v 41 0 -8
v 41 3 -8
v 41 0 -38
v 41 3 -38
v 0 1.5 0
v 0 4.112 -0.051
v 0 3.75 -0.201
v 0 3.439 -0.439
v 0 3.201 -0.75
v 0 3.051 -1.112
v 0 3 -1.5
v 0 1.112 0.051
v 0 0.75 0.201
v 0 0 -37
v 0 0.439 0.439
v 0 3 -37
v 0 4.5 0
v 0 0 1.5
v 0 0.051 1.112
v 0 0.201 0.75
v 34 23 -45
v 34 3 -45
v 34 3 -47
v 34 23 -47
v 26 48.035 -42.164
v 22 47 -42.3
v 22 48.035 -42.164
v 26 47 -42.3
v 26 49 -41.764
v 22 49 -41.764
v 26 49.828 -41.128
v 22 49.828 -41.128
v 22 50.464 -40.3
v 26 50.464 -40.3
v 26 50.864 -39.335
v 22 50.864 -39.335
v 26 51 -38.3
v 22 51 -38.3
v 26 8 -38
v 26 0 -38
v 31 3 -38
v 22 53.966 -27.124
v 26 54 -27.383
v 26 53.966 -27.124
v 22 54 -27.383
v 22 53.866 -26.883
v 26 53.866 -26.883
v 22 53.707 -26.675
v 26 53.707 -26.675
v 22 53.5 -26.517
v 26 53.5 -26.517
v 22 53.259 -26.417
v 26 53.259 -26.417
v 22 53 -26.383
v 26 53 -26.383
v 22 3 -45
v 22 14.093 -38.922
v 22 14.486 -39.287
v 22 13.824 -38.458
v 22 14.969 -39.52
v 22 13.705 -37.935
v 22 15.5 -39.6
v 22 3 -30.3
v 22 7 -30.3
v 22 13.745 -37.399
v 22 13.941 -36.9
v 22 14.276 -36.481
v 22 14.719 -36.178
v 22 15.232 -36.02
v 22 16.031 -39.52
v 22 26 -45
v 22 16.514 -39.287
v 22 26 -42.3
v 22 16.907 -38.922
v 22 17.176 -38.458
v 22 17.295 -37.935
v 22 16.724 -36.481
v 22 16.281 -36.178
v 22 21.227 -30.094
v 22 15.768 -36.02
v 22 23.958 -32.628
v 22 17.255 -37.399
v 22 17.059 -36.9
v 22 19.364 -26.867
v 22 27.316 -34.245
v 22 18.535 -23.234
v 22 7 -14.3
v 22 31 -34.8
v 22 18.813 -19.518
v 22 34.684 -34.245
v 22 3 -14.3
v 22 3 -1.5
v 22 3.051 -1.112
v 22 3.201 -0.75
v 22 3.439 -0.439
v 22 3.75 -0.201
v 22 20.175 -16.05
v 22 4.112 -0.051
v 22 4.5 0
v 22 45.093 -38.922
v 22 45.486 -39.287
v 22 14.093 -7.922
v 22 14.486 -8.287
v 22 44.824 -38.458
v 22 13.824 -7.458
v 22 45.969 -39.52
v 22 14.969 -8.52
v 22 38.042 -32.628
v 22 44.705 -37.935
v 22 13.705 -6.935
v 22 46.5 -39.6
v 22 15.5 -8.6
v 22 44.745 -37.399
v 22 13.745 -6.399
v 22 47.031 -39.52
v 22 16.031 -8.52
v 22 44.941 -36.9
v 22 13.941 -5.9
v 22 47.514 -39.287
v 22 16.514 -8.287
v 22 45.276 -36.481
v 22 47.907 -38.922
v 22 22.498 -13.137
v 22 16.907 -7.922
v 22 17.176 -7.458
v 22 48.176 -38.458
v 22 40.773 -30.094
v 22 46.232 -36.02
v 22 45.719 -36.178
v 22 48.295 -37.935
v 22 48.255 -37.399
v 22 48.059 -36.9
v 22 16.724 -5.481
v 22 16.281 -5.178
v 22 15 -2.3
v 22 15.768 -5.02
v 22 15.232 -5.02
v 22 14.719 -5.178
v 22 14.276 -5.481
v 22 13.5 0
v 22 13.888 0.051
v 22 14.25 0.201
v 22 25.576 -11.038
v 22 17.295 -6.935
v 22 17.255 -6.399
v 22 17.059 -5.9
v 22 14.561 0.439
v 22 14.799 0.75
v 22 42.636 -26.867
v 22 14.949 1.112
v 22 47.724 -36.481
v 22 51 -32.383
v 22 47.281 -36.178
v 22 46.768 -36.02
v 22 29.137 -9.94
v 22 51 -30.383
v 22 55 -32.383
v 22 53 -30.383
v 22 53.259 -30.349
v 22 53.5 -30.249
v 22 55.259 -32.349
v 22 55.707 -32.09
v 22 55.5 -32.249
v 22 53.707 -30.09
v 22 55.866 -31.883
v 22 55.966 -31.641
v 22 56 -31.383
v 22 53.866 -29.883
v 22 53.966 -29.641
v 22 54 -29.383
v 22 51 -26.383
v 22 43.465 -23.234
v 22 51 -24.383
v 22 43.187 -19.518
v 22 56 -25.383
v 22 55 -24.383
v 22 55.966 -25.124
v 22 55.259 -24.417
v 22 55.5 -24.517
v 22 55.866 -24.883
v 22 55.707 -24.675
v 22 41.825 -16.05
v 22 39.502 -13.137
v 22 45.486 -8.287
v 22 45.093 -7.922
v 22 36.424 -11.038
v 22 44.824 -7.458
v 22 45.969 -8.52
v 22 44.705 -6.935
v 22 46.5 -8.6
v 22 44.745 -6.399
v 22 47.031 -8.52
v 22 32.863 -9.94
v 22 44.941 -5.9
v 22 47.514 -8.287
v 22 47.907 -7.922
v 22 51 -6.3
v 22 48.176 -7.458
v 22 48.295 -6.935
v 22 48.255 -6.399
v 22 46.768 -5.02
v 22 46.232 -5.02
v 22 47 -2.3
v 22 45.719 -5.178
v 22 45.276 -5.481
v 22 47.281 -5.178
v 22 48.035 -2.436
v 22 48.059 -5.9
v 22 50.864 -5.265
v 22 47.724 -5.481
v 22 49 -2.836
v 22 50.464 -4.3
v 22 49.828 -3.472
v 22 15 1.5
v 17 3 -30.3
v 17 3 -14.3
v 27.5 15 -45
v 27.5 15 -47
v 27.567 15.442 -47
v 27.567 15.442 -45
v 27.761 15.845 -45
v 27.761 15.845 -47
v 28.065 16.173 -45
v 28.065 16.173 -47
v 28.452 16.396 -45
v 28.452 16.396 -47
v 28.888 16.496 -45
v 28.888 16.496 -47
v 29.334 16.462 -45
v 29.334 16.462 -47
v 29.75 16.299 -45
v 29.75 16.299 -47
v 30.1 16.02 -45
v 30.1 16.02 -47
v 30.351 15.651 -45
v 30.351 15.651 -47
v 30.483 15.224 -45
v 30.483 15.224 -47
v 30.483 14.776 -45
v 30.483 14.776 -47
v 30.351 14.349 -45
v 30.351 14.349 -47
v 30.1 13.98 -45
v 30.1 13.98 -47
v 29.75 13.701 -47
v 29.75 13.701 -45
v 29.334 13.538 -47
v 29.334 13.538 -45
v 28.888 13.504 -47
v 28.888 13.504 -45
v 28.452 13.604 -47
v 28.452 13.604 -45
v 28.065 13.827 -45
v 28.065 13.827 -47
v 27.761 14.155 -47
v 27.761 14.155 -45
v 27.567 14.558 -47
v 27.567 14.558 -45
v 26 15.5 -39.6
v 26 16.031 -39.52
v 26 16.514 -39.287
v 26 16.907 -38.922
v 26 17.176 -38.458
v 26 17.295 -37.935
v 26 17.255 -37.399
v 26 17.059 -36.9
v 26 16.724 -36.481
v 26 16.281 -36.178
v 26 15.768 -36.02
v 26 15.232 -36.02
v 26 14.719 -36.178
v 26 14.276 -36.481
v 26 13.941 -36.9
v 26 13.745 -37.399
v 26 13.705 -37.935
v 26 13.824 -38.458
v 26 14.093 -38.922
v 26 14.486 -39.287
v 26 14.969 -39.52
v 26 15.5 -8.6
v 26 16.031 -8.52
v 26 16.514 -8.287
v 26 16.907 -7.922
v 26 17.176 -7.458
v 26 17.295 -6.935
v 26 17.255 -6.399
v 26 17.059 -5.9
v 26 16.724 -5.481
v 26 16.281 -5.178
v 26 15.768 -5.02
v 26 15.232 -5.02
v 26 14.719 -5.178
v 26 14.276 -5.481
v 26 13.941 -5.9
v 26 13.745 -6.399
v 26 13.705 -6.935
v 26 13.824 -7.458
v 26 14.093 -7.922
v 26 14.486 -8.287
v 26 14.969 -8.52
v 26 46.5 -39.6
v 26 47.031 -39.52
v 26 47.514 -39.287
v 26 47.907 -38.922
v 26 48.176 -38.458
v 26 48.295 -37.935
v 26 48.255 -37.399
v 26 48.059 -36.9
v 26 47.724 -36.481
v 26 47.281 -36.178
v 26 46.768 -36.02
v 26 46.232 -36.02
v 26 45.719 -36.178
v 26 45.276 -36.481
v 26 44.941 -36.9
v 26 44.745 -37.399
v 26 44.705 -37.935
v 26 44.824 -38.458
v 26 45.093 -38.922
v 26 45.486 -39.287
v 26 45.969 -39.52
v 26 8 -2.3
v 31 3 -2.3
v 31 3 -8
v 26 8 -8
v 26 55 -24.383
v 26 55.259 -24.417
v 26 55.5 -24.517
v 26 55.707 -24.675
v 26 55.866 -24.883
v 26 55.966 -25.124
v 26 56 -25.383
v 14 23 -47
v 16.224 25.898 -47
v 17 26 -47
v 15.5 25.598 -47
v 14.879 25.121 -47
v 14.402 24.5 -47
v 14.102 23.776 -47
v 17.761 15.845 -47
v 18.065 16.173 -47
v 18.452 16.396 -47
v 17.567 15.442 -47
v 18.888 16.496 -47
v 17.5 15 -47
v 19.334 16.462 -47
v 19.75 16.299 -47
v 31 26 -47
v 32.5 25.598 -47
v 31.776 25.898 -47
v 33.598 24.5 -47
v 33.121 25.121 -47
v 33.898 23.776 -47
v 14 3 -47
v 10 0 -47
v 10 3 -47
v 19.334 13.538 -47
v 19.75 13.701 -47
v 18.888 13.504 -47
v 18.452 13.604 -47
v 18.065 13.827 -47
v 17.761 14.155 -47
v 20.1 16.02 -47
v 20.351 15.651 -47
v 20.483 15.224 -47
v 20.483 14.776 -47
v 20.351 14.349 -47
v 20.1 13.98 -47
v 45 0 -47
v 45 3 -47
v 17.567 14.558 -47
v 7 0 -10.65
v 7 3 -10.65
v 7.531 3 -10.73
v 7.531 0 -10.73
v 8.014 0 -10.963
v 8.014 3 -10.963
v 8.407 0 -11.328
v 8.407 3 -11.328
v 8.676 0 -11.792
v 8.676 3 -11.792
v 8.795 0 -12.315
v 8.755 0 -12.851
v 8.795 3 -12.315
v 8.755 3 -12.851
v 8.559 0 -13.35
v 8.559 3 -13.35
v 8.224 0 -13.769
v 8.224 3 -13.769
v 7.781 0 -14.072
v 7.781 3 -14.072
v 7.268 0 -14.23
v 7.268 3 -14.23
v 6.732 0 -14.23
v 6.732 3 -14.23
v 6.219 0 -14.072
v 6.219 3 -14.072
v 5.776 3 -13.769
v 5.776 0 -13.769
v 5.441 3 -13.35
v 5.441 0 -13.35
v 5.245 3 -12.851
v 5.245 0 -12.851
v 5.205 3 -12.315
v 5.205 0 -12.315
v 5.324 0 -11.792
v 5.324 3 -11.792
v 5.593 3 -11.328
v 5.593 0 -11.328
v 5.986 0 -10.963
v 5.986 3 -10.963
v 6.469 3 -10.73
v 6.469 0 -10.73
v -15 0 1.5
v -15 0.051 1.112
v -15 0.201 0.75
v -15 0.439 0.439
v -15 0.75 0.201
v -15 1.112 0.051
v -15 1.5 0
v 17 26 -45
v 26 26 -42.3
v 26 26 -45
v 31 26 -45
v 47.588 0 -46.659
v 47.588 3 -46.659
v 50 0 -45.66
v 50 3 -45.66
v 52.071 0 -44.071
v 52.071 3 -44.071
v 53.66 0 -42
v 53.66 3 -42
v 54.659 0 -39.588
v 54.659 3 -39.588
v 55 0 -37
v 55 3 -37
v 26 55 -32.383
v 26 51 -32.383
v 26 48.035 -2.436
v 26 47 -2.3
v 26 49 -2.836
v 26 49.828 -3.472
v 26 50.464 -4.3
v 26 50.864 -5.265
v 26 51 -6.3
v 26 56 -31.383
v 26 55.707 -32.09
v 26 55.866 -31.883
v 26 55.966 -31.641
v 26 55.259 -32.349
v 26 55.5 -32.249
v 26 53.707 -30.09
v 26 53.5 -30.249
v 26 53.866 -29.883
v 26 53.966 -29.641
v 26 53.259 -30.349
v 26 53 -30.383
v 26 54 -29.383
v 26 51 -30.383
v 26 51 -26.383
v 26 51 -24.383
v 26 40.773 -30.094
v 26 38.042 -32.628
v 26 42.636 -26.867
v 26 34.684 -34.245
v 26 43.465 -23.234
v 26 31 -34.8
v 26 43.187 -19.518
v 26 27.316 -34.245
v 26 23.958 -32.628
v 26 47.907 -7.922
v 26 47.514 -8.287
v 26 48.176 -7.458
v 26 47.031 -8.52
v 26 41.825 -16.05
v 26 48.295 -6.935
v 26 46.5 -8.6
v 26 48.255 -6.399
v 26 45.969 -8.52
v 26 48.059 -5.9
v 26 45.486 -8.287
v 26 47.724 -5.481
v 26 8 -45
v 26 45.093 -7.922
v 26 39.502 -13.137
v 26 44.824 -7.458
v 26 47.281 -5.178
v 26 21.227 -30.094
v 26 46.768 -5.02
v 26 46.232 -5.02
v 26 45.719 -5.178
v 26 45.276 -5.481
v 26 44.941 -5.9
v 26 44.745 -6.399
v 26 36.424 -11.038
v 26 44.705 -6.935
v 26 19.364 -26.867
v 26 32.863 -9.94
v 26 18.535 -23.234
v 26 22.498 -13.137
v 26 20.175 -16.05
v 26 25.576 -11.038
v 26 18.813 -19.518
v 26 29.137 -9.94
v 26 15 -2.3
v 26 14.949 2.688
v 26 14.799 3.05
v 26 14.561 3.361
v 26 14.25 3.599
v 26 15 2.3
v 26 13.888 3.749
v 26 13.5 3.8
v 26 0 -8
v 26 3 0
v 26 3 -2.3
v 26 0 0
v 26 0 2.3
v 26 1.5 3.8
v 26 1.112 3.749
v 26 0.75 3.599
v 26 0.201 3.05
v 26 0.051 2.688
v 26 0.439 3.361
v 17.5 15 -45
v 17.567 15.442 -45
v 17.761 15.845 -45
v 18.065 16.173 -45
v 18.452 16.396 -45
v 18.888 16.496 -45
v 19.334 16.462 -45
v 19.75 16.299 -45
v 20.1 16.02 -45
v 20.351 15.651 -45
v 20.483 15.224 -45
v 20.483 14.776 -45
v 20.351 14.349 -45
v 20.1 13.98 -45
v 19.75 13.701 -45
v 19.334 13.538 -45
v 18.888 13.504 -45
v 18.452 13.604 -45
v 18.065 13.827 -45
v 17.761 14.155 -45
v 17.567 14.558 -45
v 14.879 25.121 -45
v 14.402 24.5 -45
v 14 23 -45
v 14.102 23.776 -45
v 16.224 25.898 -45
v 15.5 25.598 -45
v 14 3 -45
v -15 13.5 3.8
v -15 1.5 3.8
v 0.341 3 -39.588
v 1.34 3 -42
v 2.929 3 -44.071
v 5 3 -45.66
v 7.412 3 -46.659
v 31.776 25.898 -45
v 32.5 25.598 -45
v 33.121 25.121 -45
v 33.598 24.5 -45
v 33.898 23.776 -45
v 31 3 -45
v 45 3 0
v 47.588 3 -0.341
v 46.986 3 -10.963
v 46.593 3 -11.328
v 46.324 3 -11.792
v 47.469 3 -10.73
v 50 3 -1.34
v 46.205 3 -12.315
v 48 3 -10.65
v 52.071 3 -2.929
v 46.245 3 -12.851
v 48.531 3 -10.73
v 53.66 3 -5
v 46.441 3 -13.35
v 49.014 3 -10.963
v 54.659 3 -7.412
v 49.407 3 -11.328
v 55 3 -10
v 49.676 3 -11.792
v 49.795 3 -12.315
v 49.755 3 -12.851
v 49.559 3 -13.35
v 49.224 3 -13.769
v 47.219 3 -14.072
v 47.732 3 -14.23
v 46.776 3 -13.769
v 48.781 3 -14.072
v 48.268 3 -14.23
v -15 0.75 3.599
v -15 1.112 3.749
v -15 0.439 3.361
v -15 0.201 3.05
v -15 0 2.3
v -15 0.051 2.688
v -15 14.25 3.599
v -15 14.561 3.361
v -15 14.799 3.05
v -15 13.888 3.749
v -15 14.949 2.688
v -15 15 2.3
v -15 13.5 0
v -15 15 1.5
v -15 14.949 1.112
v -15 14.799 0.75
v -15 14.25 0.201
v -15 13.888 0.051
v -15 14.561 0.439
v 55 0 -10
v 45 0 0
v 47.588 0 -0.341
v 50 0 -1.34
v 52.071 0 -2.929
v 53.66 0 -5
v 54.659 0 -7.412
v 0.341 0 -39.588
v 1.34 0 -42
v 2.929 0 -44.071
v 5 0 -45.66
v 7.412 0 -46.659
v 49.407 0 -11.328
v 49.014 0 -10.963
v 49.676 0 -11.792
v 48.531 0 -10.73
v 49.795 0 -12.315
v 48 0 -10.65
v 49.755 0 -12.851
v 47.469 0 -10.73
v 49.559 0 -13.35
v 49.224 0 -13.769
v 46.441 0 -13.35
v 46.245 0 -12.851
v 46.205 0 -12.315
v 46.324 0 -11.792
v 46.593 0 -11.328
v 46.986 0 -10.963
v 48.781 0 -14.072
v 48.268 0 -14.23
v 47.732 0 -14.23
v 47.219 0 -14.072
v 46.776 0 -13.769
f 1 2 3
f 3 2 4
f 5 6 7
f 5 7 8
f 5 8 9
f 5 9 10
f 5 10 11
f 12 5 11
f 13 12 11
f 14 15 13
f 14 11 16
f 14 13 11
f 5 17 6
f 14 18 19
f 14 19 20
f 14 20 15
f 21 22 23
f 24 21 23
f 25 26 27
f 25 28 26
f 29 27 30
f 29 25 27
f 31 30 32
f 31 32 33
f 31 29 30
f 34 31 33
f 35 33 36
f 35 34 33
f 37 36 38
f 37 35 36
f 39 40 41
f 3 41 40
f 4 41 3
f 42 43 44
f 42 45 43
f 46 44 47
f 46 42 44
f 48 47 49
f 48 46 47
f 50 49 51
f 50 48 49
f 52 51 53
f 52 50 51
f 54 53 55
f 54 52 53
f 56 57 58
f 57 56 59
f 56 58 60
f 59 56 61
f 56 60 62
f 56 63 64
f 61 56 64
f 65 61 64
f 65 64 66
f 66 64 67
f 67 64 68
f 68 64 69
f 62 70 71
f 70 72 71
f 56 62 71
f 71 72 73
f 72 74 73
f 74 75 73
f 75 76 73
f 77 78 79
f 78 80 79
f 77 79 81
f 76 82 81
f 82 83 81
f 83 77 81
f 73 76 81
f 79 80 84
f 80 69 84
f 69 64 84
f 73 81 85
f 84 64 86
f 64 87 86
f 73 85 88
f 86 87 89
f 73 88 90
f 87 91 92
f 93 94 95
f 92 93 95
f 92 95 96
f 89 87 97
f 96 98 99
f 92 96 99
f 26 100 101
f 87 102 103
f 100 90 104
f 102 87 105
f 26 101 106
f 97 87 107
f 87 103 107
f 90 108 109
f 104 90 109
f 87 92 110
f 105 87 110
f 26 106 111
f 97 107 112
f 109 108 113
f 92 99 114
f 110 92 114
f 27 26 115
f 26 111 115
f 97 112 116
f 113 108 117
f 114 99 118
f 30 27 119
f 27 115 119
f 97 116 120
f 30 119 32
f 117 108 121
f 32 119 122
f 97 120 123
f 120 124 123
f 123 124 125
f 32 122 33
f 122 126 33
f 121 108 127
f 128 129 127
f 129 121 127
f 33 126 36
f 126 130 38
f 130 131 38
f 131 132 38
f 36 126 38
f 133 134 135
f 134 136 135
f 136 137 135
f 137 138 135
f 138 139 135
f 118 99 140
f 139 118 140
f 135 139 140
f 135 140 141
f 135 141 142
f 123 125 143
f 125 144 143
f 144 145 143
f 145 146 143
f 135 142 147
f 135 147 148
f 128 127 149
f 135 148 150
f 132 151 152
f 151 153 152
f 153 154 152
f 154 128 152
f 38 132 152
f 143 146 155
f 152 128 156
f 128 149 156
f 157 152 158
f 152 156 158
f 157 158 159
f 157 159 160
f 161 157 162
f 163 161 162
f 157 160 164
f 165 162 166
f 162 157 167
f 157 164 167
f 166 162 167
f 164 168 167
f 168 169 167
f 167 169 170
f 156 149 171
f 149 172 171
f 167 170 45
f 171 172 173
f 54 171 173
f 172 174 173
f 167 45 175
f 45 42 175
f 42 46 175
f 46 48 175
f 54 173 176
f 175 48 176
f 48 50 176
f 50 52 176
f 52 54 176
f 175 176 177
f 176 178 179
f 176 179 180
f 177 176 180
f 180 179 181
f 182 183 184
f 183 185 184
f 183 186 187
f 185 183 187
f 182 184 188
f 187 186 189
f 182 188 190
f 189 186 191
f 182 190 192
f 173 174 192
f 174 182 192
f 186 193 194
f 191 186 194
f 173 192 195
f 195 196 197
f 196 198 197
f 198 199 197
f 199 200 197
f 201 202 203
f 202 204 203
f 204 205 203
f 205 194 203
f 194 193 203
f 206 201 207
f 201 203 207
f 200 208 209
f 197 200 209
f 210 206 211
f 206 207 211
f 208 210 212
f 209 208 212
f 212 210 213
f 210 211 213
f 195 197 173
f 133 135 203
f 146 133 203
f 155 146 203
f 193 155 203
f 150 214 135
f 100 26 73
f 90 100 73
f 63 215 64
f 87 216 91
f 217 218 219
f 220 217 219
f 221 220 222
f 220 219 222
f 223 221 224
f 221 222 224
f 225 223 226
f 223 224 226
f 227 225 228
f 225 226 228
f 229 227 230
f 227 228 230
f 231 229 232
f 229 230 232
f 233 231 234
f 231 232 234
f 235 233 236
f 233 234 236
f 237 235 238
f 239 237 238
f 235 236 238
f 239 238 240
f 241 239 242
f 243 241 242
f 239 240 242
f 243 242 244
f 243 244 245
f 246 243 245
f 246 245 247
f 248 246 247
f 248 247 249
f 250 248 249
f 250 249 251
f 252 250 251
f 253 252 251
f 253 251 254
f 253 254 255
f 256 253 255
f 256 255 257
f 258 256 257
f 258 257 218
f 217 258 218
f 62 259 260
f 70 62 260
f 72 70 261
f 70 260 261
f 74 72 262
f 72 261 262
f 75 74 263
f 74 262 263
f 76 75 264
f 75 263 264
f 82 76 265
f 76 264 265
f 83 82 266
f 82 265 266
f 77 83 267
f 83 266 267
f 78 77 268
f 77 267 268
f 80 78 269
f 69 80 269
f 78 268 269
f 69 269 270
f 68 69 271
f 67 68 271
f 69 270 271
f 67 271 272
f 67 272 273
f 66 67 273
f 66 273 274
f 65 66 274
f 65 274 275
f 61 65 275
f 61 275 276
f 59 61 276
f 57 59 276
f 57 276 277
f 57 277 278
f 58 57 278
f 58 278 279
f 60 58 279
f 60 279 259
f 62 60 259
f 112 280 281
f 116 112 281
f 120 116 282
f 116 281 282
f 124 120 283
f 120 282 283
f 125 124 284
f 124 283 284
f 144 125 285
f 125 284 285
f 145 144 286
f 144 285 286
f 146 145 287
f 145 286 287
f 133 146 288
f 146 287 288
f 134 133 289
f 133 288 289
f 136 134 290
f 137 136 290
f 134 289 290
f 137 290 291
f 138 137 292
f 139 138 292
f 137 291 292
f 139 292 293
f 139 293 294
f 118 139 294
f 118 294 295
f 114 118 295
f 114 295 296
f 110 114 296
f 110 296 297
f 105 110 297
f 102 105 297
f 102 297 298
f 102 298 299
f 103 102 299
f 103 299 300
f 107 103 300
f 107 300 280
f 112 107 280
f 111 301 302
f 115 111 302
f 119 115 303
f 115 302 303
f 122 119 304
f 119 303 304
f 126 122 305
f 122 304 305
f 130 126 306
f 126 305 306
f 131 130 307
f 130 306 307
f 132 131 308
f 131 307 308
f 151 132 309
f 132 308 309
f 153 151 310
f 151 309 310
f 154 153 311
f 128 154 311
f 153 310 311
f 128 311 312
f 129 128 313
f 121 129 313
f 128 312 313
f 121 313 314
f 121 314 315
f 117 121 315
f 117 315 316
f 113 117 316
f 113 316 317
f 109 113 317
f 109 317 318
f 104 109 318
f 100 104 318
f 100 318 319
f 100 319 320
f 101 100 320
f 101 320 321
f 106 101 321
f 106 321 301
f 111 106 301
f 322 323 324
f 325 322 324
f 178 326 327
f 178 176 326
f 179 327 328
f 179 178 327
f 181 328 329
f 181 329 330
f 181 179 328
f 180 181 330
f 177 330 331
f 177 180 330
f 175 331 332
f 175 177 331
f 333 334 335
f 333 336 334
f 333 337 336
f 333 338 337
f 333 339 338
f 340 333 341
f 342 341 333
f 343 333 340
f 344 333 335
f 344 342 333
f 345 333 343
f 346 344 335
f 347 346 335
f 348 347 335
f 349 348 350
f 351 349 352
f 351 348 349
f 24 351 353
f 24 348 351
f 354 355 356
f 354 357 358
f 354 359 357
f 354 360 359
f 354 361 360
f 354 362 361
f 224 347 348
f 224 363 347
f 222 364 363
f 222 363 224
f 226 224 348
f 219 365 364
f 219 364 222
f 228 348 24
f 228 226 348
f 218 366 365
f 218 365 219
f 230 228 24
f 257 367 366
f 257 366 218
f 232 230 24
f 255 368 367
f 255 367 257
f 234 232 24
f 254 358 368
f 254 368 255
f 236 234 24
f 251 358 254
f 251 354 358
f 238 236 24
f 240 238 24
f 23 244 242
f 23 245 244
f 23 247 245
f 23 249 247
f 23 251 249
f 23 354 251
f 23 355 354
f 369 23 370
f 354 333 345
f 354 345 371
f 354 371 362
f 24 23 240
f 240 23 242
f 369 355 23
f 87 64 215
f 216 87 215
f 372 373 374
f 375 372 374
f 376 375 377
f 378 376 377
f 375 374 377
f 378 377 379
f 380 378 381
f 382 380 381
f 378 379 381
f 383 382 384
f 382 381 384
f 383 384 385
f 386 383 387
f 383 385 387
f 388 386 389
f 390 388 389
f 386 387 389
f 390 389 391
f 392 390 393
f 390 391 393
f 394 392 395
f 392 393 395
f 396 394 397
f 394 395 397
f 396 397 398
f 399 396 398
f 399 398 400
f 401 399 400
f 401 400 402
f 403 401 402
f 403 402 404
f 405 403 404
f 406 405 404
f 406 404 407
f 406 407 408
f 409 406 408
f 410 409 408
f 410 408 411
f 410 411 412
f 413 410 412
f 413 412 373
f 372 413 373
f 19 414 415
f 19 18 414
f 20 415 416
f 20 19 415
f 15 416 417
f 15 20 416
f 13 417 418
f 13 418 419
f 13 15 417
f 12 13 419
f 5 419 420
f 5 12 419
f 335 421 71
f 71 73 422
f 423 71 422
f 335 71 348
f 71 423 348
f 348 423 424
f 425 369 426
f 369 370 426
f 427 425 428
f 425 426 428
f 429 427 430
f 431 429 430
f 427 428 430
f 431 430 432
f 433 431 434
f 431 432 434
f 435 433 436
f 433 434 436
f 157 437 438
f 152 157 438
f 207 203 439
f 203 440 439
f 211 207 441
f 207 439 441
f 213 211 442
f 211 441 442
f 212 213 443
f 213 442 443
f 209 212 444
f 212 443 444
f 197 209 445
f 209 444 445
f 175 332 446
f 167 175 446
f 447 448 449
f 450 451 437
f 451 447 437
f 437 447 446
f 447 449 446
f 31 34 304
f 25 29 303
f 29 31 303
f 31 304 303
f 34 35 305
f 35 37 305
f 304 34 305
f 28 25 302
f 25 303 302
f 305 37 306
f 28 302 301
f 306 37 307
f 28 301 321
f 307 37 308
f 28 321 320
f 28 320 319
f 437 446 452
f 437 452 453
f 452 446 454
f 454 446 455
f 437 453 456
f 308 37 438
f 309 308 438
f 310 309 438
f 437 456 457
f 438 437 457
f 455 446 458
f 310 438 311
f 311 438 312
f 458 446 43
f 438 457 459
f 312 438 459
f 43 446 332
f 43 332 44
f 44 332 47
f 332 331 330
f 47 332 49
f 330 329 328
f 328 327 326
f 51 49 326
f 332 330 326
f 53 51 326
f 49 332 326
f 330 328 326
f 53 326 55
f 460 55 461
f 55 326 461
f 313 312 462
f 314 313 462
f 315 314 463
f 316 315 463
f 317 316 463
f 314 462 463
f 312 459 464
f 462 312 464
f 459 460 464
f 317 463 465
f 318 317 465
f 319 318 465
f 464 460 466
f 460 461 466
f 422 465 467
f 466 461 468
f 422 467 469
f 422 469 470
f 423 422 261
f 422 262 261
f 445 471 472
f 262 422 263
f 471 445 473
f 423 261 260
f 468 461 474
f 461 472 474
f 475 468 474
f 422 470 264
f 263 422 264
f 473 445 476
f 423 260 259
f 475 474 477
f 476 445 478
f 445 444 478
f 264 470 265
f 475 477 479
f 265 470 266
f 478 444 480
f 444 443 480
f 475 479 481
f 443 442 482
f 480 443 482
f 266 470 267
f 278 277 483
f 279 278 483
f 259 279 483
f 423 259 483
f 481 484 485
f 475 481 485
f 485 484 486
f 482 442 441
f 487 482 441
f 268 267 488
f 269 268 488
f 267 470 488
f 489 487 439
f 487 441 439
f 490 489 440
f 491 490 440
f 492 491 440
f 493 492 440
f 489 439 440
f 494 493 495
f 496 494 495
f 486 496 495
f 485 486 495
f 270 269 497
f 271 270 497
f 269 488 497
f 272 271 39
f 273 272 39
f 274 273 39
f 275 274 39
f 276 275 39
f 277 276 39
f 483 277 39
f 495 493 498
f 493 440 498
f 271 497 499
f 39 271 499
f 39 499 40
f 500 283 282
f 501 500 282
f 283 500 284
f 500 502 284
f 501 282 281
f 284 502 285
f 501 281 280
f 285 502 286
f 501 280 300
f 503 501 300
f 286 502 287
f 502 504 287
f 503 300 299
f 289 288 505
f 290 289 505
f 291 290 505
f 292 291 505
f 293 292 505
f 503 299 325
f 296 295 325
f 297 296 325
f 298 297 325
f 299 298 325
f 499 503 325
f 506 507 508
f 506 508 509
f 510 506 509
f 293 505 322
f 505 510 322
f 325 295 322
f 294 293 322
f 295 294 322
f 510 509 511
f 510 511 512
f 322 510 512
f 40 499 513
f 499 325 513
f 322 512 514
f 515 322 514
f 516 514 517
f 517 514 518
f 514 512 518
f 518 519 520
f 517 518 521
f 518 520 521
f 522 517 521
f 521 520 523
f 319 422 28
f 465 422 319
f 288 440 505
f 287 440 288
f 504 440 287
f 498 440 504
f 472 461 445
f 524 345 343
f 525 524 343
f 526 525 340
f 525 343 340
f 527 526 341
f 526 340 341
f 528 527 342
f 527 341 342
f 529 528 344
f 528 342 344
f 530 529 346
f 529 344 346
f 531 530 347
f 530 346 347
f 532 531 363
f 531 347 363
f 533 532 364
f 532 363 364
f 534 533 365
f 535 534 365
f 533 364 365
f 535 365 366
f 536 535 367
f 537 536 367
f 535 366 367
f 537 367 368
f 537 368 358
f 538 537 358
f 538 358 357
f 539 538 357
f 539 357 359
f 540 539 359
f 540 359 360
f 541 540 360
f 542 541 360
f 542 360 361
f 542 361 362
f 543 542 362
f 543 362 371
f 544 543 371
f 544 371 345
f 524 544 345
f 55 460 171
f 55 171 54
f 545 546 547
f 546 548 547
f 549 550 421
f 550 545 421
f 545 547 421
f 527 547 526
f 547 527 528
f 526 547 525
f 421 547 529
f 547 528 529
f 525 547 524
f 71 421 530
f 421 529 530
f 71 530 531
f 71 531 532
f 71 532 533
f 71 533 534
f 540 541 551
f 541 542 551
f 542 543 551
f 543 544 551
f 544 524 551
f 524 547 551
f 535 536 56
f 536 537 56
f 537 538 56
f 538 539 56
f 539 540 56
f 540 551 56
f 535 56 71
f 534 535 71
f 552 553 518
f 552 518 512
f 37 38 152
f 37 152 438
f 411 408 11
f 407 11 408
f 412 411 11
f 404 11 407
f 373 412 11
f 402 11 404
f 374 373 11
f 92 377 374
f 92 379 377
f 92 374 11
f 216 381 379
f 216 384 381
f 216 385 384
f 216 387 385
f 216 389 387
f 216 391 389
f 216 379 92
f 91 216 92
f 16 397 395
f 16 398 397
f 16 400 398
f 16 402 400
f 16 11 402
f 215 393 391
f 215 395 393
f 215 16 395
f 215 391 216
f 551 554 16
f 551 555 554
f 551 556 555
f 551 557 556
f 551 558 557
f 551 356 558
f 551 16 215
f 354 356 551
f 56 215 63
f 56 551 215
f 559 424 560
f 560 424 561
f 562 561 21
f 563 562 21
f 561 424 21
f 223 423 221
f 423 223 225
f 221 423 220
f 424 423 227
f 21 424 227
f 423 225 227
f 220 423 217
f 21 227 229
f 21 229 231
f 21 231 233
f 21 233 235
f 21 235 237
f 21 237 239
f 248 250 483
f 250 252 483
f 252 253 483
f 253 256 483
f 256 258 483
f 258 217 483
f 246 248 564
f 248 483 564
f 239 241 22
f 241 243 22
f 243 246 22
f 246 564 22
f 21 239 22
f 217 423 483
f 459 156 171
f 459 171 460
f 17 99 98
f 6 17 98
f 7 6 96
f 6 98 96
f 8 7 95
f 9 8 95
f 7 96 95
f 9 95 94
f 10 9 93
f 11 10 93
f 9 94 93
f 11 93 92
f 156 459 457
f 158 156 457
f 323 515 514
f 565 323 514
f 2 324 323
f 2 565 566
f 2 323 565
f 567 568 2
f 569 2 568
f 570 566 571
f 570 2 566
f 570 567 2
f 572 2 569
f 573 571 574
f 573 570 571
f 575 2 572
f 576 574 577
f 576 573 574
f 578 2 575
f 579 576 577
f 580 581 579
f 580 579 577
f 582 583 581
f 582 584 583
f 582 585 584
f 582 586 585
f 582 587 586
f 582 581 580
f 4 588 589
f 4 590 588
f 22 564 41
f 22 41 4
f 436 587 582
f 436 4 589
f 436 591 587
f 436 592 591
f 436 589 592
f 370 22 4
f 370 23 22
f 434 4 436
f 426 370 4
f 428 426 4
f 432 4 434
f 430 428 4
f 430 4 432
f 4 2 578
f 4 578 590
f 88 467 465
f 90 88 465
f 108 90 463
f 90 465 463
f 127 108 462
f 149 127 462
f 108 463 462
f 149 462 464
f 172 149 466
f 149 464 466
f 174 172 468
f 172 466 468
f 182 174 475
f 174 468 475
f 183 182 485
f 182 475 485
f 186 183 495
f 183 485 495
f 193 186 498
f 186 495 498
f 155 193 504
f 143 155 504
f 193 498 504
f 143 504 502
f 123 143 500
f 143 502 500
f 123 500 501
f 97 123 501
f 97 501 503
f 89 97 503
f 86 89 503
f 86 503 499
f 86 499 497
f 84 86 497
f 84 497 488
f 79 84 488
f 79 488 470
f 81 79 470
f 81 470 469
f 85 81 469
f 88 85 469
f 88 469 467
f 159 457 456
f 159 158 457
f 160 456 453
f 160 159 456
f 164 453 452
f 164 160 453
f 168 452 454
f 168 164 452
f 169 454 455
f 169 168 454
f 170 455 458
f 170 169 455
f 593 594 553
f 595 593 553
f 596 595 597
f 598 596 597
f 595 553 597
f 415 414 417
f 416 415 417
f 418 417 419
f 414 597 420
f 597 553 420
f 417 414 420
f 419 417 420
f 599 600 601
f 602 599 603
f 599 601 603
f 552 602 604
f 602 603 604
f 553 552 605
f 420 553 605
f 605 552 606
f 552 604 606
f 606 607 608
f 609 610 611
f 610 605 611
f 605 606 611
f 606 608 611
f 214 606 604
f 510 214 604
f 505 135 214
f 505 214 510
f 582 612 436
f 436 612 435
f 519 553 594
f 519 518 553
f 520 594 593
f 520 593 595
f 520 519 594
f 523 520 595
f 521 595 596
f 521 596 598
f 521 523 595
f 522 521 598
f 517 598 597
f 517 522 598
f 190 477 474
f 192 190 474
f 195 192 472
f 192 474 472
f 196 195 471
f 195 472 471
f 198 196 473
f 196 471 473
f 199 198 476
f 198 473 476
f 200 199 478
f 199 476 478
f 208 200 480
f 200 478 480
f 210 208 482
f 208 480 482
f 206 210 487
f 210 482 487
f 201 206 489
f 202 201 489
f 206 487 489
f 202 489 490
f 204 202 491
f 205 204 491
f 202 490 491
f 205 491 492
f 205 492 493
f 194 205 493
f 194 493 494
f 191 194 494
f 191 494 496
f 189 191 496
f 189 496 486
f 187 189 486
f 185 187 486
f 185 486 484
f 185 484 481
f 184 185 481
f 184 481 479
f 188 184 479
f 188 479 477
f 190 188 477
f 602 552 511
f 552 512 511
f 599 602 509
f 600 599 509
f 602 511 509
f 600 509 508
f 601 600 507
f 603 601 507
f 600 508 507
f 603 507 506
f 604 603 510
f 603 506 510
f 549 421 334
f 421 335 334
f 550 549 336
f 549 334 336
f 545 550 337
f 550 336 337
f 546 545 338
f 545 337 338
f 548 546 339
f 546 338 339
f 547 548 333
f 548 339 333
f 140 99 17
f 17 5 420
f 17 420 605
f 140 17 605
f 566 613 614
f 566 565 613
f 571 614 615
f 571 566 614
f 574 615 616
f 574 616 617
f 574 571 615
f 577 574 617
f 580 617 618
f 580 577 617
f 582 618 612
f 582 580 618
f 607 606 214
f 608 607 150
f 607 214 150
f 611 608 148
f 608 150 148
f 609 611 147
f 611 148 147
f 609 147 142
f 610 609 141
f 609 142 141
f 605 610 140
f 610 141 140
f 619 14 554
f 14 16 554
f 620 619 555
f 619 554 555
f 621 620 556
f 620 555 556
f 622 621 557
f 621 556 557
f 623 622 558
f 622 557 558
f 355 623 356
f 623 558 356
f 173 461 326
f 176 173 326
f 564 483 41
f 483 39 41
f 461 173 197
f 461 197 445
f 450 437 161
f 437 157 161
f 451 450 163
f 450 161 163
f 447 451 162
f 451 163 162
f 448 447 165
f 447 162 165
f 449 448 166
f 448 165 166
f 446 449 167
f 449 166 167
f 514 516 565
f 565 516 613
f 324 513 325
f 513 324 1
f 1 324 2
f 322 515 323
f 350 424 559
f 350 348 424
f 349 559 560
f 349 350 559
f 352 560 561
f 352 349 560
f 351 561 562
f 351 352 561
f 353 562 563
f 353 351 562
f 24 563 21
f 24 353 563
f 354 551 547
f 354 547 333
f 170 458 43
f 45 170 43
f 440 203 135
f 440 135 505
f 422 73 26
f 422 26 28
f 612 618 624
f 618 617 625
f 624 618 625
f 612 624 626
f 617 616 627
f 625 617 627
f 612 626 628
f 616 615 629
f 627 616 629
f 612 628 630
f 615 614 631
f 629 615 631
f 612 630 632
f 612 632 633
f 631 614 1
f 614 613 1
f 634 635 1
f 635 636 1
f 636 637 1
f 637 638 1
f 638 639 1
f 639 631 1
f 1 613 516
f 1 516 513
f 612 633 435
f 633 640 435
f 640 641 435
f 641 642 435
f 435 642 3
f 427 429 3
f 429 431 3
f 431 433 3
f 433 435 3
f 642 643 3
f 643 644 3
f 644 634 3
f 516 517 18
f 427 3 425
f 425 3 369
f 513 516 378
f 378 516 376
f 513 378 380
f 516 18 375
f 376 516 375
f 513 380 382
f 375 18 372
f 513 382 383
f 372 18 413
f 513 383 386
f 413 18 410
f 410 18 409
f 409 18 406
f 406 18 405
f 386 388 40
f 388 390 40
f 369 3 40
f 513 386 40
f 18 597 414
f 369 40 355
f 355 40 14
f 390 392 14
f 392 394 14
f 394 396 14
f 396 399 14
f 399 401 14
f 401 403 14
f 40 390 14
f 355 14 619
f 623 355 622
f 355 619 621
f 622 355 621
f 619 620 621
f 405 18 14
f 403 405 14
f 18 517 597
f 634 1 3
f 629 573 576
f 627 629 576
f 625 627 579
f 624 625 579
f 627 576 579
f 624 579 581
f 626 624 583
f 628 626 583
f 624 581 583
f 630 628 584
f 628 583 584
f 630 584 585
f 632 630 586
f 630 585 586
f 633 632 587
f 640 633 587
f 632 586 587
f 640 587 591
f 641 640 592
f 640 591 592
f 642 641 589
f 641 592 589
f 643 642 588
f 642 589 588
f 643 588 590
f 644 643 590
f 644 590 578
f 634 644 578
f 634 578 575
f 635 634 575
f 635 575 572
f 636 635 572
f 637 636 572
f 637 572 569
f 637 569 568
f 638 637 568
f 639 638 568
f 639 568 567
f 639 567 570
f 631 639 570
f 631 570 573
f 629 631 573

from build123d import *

# Parameters (mm, degrees)
SKETCH_1_W           = 55
SKETCH_1_H           = 47
EXTRUDE_1_DEPTH      = 3
SKETCH_2_W           = 4
SKETCH_2_H           = 40
EXTRUDE_2_DEPTH      = 48
SKETCH_3_R           = 1.8
CUT_EXTRUDE_1_DEPTH  = 12
SKETCH_4_R           = 1.8
SKETCH_4_R_2         = 12.5
CUT_EXTRUDE_2_DEPTH  = 12
SKETCH_5_W           = 15
SKETCH_5_H           = 30
CUT_EXTRUDE_3_DEPTH  = 12
FILLET_1_R           = 10
FILLET_2_R           = 4
CHAMFER_1_SIZE       = 5
EXTRUDE_START        = -12
EXTRUDE_3_DEPTH      = 16
EXTRUDE_4_DEPTH      = 26
EXTRUDE_4_DEPTH_BACK = 15
SKETCH_7_W           = 3.8
SKETCH_7_H           = 15
FILLET_3_R           = 1.5
SKETCH_8_W           = 4
SKETCH_8_H           = 12
EXTRUDE_5_DEPTH      = 3.8
SKETCH_9_W           = 20
SKETCH_9_H           = 2
EXTRUDE_6_DEPTH      = 23
EXTRUDE_7_DEPTH      = 2.7
SKETCH_11_R          = 1.5
CUT_EXTRUDE_4_DEPTH  = 23
FILLET_4_R           = 3
EXTRUDE_START_2      = -4
SKETCH_12_W          = 2
SKETCH_12_H          = 3
EXTRUDE_8_DEPTH      = 4
FILLET_5_R           = 1


with BuildPart() as part:
    # Эскиз1 → Бобышка-Вытянуть1 (new body)
    with BuildSketch(Plane(origin=(0, 0, 0), x_dir=(1, 0, 0), z_dir=(0, 1, 0))):
        with Locations((27.5, 23.5)):
            Rectangle(SKETCH_1_W, SKETCH_1_H)
    extrude(amount=EXTRUDE_1_DEPTH)

    # Эскиз2 → Бобышка-Вытянуть2 (add)
    with BuildSketch(Plane(origin=(-5.991084473, 3, 0), x_dir=(1, 0, 0), z_dir=(0, 1, 0))):
        with Locations((29.991084473, 22.3)):
            Rectangle(SKETCH_2_W, SKETCH_2_H)
    extrude(amount=EXTRUDE_2_DEPTH)

    # Эскиз3 → Вырез-Вытянуть1 (cut)
    with BuildSketch(Plane(origin=(0, 3, 0), x_dir=(1, 0, 0), z_dir=(0, 1, 0))):
        with Locations(Location((7, 12.45, 0), (0, 0, 270))):
            Circle(SKETCH_3_R)
        with Locations(Location((48, 12.45, 0), (0, 0, 270))):
            Circle(SKETCH_3_R)
    extrude(amount=-CUT_EXTRUDE_1_DEPTH, mode=Mode.SUBTRACT)

    # Эскиз4 → Вырез-Вытянуть2 (cut)
    with BuildSketch(Plane(origin=(26, 0, 0), x_dir=(0, 0, -1), z_dir=(1, 0, 0))):
        with Locations((6.8, 46.5)):
            Circle(SKETCH_4_R)
        with Locations((37.8, 46.5)):
            Circle(SKETCH_4_R)
        with Locations((6.8, 15.5)):
            Circle(SKETCH_4_R)
        with Locations((37.8, 15.5)):
            Circle(SKETCH_4_R)
        with Locations((22.3, 31)):
            Circle(SKETCH_4_R_2)
    extrude(amount=-CUT_EXTRUDE_2_DEPTH, mode=Mode.SUBTRACT)

    # Эскиз5 → Вырез-Вытянуть3 (cut)
    with BuildSketch(Plane(origin=(0, 3, 0), x_dir=(1, 0, 0), z_dir=(0, 1, 0))):
        with Locations((33.5, 23)):
            Rectangle(SKETCH_5_W, SKETCH_5_H)
    extrude(amount=-CUT_EXTRUDE_3_DEPTH, mode=Mode.SUBTRACT)

    # Скругление1
    fillet_1_edges = [part.edges().sort_by_distance(p)[0] for p in [
        (0, 1.5, -47),
        (55, 1.5, -47),
        (55, 1.5, 0),
    ]]
    fillet(fillet_1_edges, radius=FILLET_1_R)

    # Скругление2
    fillet_2_edges = [part.edges().sort_by_distance(p)[0] for p in [
        (24, 51, -2.3),
        (24, 51, -42.3),
    ]]
    fillet(fillet_2_edges, radius=FILLET_2_R)

    # Фаска1
    chamfer_1_edges = [part.edges().sort_by_distance(p)[0] for p in [
        (26, 3, -5.15),
        (26, 3, -40.15),
    ]]
    chamfer(chamfer_1_edges, length=CHAMFER_1_SIZE)

    # Эскиз6 → Бобышка-Вытянуть3 (add)
    with BuildSketch(Plane(origin=(0, 0, -42.3), x_dir=(-1, 0, 0), z_dir=(0, 0, -1)).offset(EXTRUDE_START)):
        Polygon((-22, 3), (-22, 7), (-17, 3), align=None)
    extrude(amount=-EXTRUDE_3_DEPTH)

    # Эскиз7 → Бобышка-Вытянуть4 (add, two sides: drawn at the far end of the back side and taken through both)
    with BuildSketch(Plane(origin=(0, 0, 0), x_dir=(0, 0, -1), z_dir=(1, 0, 0)).offset(-EXTRUDE_4_DEPTH_BACK)):
        with Locations((-1.9, 7.5)):
            Rectangle(SKETCH_7_W, SKETCH_7_H)
    extrude(amount=EXTRUDE_4_DEPTH + EXTRUDE_4_DEPTH_BACK)

    # Скругление3
    fillet_3_edges = [part.edges().sort_by_distance(p)[0] for p in [
        (5.5, 15, 0),
        (5.5, 0, 3.8),
        (5.5, 15, 3.8),
        (-7.5, 0, 0),
        (13, 3, 0),
    ]]
    fillet(fillet_3_edges, radius=FILLET_3_R)

    # Эскиз8 → Бобышка-Вытянуть5 (add)
    with BuildSketch(Plane.XY.offset(-2.3)):
        with Locations((24, 9)):
            Rectangle(SKETCH_8_W, SKETCH_8_H)
    extrude(amount=EXTRUDE_5_DEPTH)

    # Эскиз9 → Бобышка-Вытянуть6 (add)
    with BuildSketch(Plane(origin=(0, 3, 0), x_dir=(1, 0, 0), z_dir=(0, 1, 0))):
        with Locations((24, 46)):
            Rectangle(SKETCH_9_W, SKETCH_9_H)
    extrude(amount=EXTRUDE_6_DEPTH)

    # Эскиз10 → Бобышка-Вытянуть7 (add)
    with BuildSketch(Plane(origin=(0, 0, -42.3), x_dir=(-1, 0, 0), z_dir=(0, 0, -1))):
        Polygon((-22, 26), (-26, 26), (-26, 8), (-31, 3), (-22, 3), align=None)
    extrude(amount=EXTRUDE_7_DEPTH)

    # Эскиз11 → Вырез-Вытянуть4 (cut)
    with BuildSketch(Plane(origin=(0, 0, -47), x_dir=(-1, 0, 0), z_dir=(0, 0, -1))):
        with Locations((-29, 15)):
            Circle(SKETCH_11_R)
        with Locations((-19, 15)):
            Circle(SKETCH_11_R)
    extrude(amount=-CUT_EXTRUDE_4_DEPTH, mode=Mode.SUBTRACT)

    # Скругление4
    fillet_4_edges = [part.edges().sort_by_distance(p)[0] for p in [
        (14, 26, -46),
        (34, 26, -46),
    ]]
    fillet(fillet_4_edges, radius=FILLET_4_R)

    # Эскиз12 → Бобышка-Вытянуть8 (add)
    with BuildSketch(Plane.ZY.offset(-22).offset(EXTRUDE_START_2)):
        Polygon((-32.382601146, 56), (-32.382601146, 54), (-30.382601146, 54), (-26.382601146, 54), (-24.382601146, 54), (-24.382601146, 56), align=None)
        with Locations((-31.382601146, 52.5)):
            Rectangle(SKETCH_12_W, SKETCH_12_H)
        with Locations((-25.382601146, 52.5)):
            Rectangle(SKETCH_12_W, SKETCH_12_H)
    extrude(amount=EXTRUDE_8_DEPTH)

    # Скругление5
    fillet_5_edges = [part.edges().sort_by_distance(p)[0] for p in [
        (24, 54, -26.382601146),
        (24, 54, -30.382601146),
        (24, 56, -32.382601146),
        (24, 56, -24.382601146),
    ]]
    fillet(fillet_5_edges, radius=FILLET_5_R)


solid = part.part
